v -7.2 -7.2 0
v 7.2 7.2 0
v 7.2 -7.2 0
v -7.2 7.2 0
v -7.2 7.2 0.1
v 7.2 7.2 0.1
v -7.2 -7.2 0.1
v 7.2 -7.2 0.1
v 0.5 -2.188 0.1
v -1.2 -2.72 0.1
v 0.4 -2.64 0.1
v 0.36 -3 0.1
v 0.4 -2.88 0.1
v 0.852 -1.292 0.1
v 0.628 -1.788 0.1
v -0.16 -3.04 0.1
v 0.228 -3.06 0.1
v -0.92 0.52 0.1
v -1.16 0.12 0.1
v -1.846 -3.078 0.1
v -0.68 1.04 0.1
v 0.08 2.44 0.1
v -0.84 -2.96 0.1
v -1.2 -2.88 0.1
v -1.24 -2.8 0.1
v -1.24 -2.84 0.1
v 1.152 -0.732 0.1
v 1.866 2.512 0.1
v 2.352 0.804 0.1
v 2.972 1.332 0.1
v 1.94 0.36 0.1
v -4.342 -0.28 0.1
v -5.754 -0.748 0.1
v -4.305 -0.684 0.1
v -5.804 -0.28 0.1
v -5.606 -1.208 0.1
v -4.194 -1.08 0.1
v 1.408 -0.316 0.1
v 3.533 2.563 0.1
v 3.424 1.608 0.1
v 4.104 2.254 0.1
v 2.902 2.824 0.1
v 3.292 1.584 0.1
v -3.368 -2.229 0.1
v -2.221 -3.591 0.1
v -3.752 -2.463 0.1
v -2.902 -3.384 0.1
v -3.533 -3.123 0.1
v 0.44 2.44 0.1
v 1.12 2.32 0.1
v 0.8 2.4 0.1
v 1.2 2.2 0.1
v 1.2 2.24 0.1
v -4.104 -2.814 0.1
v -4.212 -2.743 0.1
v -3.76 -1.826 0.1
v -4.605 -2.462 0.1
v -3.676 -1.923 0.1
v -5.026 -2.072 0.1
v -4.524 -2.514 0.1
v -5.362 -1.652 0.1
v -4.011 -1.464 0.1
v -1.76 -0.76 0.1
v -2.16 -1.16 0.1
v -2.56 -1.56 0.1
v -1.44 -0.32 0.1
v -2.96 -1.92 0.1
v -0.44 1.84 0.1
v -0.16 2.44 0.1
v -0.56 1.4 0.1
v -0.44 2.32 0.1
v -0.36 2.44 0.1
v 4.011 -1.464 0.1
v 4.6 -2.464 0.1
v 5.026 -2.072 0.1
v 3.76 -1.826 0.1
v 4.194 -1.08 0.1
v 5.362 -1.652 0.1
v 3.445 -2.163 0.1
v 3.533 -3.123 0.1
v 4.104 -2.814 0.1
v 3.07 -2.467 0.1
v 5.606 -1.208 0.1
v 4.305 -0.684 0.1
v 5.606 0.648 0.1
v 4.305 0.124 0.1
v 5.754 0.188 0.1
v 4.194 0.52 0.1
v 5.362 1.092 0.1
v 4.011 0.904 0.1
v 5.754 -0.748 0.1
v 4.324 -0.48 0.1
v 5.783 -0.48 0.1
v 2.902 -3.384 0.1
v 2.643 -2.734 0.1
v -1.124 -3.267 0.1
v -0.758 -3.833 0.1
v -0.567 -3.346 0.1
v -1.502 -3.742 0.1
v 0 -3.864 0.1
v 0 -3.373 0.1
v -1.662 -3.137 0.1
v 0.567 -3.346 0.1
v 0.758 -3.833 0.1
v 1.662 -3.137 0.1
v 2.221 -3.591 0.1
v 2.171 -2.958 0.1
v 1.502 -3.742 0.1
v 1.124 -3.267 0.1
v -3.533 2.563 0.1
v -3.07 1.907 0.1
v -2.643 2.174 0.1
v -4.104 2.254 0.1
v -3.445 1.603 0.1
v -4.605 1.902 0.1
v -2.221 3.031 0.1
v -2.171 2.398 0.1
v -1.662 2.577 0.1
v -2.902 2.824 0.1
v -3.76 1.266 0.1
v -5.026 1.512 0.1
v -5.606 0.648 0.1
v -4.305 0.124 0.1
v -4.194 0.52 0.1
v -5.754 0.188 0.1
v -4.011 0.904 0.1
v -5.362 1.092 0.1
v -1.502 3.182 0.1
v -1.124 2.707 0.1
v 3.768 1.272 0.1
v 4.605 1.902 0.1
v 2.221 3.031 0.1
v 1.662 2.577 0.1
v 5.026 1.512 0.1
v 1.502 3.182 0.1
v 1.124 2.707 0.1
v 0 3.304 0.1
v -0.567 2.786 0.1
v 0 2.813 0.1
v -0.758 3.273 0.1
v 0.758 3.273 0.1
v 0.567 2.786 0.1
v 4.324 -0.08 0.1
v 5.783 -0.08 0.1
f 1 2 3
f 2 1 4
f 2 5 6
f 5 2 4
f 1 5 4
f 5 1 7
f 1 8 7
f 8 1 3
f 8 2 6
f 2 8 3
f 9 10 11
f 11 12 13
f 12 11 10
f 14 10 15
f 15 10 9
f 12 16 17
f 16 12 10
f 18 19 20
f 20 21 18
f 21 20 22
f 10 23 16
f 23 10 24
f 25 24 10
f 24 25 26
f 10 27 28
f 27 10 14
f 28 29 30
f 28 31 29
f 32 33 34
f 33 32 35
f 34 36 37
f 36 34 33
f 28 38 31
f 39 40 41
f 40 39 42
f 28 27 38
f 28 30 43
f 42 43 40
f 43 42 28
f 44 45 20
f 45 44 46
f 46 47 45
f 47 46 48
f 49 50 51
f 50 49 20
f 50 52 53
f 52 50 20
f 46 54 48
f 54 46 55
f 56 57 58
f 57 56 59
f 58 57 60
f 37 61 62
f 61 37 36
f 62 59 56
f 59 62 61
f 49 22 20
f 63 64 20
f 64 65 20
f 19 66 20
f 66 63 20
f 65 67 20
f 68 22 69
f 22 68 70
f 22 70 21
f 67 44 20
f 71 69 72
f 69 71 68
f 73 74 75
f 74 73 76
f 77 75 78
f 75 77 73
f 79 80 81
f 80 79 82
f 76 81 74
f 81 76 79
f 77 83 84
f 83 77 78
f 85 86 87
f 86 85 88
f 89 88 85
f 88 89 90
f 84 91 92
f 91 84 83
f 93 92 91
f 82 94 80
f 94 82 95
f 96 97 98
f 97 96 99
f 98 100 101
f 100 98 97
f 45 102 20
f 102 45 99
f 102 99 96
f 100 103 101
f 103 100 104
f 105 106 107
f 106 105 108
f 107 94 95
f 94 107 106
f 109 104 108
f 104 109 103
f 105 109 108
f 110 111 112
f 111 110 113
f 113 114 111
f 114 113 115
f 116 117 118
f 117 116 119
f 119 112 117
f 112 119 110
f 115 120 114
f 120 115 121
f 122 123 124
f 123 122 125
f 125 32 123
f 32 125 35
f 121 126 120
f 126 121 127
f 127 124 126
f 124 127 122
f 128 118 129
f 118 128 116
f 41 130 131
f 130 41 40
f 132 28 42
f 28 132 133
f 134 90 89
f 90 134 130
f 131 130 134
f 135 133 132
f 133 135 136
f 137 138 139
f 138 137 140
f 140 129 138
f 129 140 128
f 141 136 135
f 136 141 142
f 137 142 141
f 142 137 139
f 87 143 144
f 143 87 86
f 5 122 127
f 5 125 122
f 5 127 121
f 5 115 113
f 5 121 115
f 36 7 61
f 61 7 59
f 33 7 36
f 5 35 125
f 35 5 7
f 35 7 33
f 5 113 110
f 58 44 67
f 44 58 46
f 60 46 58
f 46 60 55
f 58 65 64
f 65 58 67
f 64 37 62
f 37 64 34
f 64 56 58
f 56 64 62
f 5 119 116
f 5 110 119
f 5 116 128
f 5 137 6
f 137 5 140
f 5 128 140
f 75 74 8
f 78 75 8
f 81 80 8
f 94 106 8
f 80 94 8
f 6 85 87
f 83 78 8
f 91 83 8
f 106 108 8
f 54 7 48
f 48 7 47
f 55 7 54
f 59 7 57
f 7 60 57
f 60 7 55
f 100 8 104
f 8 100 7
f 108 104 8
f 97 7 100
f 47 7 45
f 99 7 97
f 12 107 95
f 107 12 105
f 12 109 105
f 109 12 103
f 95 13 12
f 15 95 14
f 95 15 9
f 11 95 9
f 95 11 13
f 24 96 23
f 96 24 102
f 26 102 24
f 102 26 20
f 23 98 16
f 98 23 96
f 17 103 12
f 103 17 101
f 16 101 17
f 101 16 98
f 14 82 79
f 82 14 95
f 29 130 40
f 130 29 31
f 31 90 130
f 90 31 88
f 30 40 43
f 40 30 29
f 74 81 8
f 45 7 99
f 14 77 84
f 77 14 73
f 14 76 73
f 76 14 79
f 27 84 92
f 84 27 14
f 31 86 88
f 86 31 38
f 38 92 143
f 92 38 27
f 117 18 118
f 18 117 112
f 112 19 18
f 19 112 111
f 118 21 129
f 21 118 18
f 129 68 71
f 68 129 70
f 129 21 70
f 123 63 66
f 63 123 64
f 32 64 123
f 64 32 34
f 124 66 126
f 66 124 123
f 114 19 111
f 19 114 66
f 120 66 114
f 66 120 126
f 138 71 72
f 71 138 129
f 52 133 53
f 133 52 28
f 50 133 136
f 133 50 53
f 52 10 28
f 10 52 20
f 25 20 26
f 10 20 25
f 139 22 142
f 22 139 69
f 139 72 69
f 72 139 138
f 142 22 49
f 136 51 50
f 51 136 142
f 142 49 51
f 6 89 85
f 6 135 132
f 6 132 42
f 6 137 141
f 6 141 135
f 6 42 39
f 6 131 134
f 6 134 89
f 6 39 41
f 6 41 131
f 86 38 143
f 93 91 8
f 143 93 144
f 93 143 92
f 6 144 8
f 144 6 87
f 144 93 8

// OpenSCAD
// file: ../p/box5-12.scad
use <../lib.scad>
function ldraw_lib__box5_12() = [
// 0 Box with 5 Faces without Any Edges
// 0 Name: box5-12.dat
// 0 Author: Chris Dee [cwdee]
// 0 !LDRAW_ORG Primitive UPDATE 2009-02
// 0 !LICENSE Licensed under CC BY 4.0 : see CAreadme.txt
// 
// 0 BFC CERTIFY CCW
  [0,"BFC","CERTIFY"],
  [0,"BFC","CCW"],
// 
// 0 !HISTORY 2009-09-03 [PTadmin] Official Update 2009-02
// 
// 
// 4 16 1 1 1 1 1 -1 -1 1 -1 -1 1 1
  [4,16,1,1,1,1,1,-1,-1,1,-1,-1,1,1],
// 4 16 -1 0 1 1 0 1 1 1 1 -1 1 1
  [4,16,-1,0,1,1,0,1,1,1,1,-1,1,1],
// 4 16 -1 0 -1 -1 0 1 -1 1 1 -1 1 -1
  [4,16,-1,0,-1,-1,0,1,-1,1,1,-1,1,-1],
// 4 16 1 0 -1 -1 0 -1 -1 1 -1 1 1 -1
  [4,16,1,0,-1,-1,0,-1,-1,1,-1,1,1,-1],
// 4 16 1 0 1 1 0 -1 1 1 -1 1 1 1
  [4,16,1,0,1,1,0,-1,1,1,-1,1,1,1],
// 0
];
module ldraw_lib__box5_12(step=0, col=false, unit=2/5, alt=false, line=0.2, solid=!$preview)
    makepoly(ldraw_lib__box5_12(), step=step, col=col, unit=unit, alt=alt, line=line, solid=solid);
ldraw_lib__box5_12(line=0.2);
// main file
use <../lib.scad>
use <../p/box5-12.scad>
use <s/168315is01.scad>
use <s/168315is02.scad>
function ldraw_lib__169795a() = [
// 0 Sticker  1.8 x  1.8 with White "LT" Logo on Red Background
// 0 Name: 169795a.dat
// 0 Author: Max Martin Richter [MMR1988]
// 0 !LDRAW_ORG Part UPDATE 2023-05
// 0 !LICENSE Licensed under CC BY 4.0 : see CAreadme.txt
// 
// 0 BFC CERTIFY CCW
  [0,"BFC","CERTIFY"],
  [0,"BFC","CCW"],
// 
// 0 !KEYWORDS Formula 1, Racer, Set 8440
// 
// 0 !HISTORY 2023-10-31 [OrionP] Official Update 2023-05
// 
// 
// 1 16 0 -0.25 0 18 0 0 0 0.25 0 0 0 18 box5-12.dat
  [1,16,0,-0.25,0,18,0,0,0,0.25,0,0,0,18, ldraw_lib__box5_12()],
// 
// 1 15 0 -0.25 0 1 0 0 0 1 0 0 0 1 s\168315is01.dat
  [1,15,0,-0.25,0,1,0,0,0,1,0,0,0,1, ldraw_lib__s__168315is01()],
// 1 4 0 -0.25 0 1 0 0 0 1 0 0 0 1 s\168315is02.dat
  [1,4,0,-0.25,0,1,0,0,0,1,0,0,0,1, ldraw_lib__s__168315is02()],
];
module ldraw_lib__169795a(step=0, col=false, unit=2/5, alt=false, line=0.2, solid=!$preview)
    makepoly(ldraw_lib__169795a(), step=step, col=col, unit=unit, alt=alt, line=line, solid=solid);
ldraw_lib__169795a(line=0.2);
